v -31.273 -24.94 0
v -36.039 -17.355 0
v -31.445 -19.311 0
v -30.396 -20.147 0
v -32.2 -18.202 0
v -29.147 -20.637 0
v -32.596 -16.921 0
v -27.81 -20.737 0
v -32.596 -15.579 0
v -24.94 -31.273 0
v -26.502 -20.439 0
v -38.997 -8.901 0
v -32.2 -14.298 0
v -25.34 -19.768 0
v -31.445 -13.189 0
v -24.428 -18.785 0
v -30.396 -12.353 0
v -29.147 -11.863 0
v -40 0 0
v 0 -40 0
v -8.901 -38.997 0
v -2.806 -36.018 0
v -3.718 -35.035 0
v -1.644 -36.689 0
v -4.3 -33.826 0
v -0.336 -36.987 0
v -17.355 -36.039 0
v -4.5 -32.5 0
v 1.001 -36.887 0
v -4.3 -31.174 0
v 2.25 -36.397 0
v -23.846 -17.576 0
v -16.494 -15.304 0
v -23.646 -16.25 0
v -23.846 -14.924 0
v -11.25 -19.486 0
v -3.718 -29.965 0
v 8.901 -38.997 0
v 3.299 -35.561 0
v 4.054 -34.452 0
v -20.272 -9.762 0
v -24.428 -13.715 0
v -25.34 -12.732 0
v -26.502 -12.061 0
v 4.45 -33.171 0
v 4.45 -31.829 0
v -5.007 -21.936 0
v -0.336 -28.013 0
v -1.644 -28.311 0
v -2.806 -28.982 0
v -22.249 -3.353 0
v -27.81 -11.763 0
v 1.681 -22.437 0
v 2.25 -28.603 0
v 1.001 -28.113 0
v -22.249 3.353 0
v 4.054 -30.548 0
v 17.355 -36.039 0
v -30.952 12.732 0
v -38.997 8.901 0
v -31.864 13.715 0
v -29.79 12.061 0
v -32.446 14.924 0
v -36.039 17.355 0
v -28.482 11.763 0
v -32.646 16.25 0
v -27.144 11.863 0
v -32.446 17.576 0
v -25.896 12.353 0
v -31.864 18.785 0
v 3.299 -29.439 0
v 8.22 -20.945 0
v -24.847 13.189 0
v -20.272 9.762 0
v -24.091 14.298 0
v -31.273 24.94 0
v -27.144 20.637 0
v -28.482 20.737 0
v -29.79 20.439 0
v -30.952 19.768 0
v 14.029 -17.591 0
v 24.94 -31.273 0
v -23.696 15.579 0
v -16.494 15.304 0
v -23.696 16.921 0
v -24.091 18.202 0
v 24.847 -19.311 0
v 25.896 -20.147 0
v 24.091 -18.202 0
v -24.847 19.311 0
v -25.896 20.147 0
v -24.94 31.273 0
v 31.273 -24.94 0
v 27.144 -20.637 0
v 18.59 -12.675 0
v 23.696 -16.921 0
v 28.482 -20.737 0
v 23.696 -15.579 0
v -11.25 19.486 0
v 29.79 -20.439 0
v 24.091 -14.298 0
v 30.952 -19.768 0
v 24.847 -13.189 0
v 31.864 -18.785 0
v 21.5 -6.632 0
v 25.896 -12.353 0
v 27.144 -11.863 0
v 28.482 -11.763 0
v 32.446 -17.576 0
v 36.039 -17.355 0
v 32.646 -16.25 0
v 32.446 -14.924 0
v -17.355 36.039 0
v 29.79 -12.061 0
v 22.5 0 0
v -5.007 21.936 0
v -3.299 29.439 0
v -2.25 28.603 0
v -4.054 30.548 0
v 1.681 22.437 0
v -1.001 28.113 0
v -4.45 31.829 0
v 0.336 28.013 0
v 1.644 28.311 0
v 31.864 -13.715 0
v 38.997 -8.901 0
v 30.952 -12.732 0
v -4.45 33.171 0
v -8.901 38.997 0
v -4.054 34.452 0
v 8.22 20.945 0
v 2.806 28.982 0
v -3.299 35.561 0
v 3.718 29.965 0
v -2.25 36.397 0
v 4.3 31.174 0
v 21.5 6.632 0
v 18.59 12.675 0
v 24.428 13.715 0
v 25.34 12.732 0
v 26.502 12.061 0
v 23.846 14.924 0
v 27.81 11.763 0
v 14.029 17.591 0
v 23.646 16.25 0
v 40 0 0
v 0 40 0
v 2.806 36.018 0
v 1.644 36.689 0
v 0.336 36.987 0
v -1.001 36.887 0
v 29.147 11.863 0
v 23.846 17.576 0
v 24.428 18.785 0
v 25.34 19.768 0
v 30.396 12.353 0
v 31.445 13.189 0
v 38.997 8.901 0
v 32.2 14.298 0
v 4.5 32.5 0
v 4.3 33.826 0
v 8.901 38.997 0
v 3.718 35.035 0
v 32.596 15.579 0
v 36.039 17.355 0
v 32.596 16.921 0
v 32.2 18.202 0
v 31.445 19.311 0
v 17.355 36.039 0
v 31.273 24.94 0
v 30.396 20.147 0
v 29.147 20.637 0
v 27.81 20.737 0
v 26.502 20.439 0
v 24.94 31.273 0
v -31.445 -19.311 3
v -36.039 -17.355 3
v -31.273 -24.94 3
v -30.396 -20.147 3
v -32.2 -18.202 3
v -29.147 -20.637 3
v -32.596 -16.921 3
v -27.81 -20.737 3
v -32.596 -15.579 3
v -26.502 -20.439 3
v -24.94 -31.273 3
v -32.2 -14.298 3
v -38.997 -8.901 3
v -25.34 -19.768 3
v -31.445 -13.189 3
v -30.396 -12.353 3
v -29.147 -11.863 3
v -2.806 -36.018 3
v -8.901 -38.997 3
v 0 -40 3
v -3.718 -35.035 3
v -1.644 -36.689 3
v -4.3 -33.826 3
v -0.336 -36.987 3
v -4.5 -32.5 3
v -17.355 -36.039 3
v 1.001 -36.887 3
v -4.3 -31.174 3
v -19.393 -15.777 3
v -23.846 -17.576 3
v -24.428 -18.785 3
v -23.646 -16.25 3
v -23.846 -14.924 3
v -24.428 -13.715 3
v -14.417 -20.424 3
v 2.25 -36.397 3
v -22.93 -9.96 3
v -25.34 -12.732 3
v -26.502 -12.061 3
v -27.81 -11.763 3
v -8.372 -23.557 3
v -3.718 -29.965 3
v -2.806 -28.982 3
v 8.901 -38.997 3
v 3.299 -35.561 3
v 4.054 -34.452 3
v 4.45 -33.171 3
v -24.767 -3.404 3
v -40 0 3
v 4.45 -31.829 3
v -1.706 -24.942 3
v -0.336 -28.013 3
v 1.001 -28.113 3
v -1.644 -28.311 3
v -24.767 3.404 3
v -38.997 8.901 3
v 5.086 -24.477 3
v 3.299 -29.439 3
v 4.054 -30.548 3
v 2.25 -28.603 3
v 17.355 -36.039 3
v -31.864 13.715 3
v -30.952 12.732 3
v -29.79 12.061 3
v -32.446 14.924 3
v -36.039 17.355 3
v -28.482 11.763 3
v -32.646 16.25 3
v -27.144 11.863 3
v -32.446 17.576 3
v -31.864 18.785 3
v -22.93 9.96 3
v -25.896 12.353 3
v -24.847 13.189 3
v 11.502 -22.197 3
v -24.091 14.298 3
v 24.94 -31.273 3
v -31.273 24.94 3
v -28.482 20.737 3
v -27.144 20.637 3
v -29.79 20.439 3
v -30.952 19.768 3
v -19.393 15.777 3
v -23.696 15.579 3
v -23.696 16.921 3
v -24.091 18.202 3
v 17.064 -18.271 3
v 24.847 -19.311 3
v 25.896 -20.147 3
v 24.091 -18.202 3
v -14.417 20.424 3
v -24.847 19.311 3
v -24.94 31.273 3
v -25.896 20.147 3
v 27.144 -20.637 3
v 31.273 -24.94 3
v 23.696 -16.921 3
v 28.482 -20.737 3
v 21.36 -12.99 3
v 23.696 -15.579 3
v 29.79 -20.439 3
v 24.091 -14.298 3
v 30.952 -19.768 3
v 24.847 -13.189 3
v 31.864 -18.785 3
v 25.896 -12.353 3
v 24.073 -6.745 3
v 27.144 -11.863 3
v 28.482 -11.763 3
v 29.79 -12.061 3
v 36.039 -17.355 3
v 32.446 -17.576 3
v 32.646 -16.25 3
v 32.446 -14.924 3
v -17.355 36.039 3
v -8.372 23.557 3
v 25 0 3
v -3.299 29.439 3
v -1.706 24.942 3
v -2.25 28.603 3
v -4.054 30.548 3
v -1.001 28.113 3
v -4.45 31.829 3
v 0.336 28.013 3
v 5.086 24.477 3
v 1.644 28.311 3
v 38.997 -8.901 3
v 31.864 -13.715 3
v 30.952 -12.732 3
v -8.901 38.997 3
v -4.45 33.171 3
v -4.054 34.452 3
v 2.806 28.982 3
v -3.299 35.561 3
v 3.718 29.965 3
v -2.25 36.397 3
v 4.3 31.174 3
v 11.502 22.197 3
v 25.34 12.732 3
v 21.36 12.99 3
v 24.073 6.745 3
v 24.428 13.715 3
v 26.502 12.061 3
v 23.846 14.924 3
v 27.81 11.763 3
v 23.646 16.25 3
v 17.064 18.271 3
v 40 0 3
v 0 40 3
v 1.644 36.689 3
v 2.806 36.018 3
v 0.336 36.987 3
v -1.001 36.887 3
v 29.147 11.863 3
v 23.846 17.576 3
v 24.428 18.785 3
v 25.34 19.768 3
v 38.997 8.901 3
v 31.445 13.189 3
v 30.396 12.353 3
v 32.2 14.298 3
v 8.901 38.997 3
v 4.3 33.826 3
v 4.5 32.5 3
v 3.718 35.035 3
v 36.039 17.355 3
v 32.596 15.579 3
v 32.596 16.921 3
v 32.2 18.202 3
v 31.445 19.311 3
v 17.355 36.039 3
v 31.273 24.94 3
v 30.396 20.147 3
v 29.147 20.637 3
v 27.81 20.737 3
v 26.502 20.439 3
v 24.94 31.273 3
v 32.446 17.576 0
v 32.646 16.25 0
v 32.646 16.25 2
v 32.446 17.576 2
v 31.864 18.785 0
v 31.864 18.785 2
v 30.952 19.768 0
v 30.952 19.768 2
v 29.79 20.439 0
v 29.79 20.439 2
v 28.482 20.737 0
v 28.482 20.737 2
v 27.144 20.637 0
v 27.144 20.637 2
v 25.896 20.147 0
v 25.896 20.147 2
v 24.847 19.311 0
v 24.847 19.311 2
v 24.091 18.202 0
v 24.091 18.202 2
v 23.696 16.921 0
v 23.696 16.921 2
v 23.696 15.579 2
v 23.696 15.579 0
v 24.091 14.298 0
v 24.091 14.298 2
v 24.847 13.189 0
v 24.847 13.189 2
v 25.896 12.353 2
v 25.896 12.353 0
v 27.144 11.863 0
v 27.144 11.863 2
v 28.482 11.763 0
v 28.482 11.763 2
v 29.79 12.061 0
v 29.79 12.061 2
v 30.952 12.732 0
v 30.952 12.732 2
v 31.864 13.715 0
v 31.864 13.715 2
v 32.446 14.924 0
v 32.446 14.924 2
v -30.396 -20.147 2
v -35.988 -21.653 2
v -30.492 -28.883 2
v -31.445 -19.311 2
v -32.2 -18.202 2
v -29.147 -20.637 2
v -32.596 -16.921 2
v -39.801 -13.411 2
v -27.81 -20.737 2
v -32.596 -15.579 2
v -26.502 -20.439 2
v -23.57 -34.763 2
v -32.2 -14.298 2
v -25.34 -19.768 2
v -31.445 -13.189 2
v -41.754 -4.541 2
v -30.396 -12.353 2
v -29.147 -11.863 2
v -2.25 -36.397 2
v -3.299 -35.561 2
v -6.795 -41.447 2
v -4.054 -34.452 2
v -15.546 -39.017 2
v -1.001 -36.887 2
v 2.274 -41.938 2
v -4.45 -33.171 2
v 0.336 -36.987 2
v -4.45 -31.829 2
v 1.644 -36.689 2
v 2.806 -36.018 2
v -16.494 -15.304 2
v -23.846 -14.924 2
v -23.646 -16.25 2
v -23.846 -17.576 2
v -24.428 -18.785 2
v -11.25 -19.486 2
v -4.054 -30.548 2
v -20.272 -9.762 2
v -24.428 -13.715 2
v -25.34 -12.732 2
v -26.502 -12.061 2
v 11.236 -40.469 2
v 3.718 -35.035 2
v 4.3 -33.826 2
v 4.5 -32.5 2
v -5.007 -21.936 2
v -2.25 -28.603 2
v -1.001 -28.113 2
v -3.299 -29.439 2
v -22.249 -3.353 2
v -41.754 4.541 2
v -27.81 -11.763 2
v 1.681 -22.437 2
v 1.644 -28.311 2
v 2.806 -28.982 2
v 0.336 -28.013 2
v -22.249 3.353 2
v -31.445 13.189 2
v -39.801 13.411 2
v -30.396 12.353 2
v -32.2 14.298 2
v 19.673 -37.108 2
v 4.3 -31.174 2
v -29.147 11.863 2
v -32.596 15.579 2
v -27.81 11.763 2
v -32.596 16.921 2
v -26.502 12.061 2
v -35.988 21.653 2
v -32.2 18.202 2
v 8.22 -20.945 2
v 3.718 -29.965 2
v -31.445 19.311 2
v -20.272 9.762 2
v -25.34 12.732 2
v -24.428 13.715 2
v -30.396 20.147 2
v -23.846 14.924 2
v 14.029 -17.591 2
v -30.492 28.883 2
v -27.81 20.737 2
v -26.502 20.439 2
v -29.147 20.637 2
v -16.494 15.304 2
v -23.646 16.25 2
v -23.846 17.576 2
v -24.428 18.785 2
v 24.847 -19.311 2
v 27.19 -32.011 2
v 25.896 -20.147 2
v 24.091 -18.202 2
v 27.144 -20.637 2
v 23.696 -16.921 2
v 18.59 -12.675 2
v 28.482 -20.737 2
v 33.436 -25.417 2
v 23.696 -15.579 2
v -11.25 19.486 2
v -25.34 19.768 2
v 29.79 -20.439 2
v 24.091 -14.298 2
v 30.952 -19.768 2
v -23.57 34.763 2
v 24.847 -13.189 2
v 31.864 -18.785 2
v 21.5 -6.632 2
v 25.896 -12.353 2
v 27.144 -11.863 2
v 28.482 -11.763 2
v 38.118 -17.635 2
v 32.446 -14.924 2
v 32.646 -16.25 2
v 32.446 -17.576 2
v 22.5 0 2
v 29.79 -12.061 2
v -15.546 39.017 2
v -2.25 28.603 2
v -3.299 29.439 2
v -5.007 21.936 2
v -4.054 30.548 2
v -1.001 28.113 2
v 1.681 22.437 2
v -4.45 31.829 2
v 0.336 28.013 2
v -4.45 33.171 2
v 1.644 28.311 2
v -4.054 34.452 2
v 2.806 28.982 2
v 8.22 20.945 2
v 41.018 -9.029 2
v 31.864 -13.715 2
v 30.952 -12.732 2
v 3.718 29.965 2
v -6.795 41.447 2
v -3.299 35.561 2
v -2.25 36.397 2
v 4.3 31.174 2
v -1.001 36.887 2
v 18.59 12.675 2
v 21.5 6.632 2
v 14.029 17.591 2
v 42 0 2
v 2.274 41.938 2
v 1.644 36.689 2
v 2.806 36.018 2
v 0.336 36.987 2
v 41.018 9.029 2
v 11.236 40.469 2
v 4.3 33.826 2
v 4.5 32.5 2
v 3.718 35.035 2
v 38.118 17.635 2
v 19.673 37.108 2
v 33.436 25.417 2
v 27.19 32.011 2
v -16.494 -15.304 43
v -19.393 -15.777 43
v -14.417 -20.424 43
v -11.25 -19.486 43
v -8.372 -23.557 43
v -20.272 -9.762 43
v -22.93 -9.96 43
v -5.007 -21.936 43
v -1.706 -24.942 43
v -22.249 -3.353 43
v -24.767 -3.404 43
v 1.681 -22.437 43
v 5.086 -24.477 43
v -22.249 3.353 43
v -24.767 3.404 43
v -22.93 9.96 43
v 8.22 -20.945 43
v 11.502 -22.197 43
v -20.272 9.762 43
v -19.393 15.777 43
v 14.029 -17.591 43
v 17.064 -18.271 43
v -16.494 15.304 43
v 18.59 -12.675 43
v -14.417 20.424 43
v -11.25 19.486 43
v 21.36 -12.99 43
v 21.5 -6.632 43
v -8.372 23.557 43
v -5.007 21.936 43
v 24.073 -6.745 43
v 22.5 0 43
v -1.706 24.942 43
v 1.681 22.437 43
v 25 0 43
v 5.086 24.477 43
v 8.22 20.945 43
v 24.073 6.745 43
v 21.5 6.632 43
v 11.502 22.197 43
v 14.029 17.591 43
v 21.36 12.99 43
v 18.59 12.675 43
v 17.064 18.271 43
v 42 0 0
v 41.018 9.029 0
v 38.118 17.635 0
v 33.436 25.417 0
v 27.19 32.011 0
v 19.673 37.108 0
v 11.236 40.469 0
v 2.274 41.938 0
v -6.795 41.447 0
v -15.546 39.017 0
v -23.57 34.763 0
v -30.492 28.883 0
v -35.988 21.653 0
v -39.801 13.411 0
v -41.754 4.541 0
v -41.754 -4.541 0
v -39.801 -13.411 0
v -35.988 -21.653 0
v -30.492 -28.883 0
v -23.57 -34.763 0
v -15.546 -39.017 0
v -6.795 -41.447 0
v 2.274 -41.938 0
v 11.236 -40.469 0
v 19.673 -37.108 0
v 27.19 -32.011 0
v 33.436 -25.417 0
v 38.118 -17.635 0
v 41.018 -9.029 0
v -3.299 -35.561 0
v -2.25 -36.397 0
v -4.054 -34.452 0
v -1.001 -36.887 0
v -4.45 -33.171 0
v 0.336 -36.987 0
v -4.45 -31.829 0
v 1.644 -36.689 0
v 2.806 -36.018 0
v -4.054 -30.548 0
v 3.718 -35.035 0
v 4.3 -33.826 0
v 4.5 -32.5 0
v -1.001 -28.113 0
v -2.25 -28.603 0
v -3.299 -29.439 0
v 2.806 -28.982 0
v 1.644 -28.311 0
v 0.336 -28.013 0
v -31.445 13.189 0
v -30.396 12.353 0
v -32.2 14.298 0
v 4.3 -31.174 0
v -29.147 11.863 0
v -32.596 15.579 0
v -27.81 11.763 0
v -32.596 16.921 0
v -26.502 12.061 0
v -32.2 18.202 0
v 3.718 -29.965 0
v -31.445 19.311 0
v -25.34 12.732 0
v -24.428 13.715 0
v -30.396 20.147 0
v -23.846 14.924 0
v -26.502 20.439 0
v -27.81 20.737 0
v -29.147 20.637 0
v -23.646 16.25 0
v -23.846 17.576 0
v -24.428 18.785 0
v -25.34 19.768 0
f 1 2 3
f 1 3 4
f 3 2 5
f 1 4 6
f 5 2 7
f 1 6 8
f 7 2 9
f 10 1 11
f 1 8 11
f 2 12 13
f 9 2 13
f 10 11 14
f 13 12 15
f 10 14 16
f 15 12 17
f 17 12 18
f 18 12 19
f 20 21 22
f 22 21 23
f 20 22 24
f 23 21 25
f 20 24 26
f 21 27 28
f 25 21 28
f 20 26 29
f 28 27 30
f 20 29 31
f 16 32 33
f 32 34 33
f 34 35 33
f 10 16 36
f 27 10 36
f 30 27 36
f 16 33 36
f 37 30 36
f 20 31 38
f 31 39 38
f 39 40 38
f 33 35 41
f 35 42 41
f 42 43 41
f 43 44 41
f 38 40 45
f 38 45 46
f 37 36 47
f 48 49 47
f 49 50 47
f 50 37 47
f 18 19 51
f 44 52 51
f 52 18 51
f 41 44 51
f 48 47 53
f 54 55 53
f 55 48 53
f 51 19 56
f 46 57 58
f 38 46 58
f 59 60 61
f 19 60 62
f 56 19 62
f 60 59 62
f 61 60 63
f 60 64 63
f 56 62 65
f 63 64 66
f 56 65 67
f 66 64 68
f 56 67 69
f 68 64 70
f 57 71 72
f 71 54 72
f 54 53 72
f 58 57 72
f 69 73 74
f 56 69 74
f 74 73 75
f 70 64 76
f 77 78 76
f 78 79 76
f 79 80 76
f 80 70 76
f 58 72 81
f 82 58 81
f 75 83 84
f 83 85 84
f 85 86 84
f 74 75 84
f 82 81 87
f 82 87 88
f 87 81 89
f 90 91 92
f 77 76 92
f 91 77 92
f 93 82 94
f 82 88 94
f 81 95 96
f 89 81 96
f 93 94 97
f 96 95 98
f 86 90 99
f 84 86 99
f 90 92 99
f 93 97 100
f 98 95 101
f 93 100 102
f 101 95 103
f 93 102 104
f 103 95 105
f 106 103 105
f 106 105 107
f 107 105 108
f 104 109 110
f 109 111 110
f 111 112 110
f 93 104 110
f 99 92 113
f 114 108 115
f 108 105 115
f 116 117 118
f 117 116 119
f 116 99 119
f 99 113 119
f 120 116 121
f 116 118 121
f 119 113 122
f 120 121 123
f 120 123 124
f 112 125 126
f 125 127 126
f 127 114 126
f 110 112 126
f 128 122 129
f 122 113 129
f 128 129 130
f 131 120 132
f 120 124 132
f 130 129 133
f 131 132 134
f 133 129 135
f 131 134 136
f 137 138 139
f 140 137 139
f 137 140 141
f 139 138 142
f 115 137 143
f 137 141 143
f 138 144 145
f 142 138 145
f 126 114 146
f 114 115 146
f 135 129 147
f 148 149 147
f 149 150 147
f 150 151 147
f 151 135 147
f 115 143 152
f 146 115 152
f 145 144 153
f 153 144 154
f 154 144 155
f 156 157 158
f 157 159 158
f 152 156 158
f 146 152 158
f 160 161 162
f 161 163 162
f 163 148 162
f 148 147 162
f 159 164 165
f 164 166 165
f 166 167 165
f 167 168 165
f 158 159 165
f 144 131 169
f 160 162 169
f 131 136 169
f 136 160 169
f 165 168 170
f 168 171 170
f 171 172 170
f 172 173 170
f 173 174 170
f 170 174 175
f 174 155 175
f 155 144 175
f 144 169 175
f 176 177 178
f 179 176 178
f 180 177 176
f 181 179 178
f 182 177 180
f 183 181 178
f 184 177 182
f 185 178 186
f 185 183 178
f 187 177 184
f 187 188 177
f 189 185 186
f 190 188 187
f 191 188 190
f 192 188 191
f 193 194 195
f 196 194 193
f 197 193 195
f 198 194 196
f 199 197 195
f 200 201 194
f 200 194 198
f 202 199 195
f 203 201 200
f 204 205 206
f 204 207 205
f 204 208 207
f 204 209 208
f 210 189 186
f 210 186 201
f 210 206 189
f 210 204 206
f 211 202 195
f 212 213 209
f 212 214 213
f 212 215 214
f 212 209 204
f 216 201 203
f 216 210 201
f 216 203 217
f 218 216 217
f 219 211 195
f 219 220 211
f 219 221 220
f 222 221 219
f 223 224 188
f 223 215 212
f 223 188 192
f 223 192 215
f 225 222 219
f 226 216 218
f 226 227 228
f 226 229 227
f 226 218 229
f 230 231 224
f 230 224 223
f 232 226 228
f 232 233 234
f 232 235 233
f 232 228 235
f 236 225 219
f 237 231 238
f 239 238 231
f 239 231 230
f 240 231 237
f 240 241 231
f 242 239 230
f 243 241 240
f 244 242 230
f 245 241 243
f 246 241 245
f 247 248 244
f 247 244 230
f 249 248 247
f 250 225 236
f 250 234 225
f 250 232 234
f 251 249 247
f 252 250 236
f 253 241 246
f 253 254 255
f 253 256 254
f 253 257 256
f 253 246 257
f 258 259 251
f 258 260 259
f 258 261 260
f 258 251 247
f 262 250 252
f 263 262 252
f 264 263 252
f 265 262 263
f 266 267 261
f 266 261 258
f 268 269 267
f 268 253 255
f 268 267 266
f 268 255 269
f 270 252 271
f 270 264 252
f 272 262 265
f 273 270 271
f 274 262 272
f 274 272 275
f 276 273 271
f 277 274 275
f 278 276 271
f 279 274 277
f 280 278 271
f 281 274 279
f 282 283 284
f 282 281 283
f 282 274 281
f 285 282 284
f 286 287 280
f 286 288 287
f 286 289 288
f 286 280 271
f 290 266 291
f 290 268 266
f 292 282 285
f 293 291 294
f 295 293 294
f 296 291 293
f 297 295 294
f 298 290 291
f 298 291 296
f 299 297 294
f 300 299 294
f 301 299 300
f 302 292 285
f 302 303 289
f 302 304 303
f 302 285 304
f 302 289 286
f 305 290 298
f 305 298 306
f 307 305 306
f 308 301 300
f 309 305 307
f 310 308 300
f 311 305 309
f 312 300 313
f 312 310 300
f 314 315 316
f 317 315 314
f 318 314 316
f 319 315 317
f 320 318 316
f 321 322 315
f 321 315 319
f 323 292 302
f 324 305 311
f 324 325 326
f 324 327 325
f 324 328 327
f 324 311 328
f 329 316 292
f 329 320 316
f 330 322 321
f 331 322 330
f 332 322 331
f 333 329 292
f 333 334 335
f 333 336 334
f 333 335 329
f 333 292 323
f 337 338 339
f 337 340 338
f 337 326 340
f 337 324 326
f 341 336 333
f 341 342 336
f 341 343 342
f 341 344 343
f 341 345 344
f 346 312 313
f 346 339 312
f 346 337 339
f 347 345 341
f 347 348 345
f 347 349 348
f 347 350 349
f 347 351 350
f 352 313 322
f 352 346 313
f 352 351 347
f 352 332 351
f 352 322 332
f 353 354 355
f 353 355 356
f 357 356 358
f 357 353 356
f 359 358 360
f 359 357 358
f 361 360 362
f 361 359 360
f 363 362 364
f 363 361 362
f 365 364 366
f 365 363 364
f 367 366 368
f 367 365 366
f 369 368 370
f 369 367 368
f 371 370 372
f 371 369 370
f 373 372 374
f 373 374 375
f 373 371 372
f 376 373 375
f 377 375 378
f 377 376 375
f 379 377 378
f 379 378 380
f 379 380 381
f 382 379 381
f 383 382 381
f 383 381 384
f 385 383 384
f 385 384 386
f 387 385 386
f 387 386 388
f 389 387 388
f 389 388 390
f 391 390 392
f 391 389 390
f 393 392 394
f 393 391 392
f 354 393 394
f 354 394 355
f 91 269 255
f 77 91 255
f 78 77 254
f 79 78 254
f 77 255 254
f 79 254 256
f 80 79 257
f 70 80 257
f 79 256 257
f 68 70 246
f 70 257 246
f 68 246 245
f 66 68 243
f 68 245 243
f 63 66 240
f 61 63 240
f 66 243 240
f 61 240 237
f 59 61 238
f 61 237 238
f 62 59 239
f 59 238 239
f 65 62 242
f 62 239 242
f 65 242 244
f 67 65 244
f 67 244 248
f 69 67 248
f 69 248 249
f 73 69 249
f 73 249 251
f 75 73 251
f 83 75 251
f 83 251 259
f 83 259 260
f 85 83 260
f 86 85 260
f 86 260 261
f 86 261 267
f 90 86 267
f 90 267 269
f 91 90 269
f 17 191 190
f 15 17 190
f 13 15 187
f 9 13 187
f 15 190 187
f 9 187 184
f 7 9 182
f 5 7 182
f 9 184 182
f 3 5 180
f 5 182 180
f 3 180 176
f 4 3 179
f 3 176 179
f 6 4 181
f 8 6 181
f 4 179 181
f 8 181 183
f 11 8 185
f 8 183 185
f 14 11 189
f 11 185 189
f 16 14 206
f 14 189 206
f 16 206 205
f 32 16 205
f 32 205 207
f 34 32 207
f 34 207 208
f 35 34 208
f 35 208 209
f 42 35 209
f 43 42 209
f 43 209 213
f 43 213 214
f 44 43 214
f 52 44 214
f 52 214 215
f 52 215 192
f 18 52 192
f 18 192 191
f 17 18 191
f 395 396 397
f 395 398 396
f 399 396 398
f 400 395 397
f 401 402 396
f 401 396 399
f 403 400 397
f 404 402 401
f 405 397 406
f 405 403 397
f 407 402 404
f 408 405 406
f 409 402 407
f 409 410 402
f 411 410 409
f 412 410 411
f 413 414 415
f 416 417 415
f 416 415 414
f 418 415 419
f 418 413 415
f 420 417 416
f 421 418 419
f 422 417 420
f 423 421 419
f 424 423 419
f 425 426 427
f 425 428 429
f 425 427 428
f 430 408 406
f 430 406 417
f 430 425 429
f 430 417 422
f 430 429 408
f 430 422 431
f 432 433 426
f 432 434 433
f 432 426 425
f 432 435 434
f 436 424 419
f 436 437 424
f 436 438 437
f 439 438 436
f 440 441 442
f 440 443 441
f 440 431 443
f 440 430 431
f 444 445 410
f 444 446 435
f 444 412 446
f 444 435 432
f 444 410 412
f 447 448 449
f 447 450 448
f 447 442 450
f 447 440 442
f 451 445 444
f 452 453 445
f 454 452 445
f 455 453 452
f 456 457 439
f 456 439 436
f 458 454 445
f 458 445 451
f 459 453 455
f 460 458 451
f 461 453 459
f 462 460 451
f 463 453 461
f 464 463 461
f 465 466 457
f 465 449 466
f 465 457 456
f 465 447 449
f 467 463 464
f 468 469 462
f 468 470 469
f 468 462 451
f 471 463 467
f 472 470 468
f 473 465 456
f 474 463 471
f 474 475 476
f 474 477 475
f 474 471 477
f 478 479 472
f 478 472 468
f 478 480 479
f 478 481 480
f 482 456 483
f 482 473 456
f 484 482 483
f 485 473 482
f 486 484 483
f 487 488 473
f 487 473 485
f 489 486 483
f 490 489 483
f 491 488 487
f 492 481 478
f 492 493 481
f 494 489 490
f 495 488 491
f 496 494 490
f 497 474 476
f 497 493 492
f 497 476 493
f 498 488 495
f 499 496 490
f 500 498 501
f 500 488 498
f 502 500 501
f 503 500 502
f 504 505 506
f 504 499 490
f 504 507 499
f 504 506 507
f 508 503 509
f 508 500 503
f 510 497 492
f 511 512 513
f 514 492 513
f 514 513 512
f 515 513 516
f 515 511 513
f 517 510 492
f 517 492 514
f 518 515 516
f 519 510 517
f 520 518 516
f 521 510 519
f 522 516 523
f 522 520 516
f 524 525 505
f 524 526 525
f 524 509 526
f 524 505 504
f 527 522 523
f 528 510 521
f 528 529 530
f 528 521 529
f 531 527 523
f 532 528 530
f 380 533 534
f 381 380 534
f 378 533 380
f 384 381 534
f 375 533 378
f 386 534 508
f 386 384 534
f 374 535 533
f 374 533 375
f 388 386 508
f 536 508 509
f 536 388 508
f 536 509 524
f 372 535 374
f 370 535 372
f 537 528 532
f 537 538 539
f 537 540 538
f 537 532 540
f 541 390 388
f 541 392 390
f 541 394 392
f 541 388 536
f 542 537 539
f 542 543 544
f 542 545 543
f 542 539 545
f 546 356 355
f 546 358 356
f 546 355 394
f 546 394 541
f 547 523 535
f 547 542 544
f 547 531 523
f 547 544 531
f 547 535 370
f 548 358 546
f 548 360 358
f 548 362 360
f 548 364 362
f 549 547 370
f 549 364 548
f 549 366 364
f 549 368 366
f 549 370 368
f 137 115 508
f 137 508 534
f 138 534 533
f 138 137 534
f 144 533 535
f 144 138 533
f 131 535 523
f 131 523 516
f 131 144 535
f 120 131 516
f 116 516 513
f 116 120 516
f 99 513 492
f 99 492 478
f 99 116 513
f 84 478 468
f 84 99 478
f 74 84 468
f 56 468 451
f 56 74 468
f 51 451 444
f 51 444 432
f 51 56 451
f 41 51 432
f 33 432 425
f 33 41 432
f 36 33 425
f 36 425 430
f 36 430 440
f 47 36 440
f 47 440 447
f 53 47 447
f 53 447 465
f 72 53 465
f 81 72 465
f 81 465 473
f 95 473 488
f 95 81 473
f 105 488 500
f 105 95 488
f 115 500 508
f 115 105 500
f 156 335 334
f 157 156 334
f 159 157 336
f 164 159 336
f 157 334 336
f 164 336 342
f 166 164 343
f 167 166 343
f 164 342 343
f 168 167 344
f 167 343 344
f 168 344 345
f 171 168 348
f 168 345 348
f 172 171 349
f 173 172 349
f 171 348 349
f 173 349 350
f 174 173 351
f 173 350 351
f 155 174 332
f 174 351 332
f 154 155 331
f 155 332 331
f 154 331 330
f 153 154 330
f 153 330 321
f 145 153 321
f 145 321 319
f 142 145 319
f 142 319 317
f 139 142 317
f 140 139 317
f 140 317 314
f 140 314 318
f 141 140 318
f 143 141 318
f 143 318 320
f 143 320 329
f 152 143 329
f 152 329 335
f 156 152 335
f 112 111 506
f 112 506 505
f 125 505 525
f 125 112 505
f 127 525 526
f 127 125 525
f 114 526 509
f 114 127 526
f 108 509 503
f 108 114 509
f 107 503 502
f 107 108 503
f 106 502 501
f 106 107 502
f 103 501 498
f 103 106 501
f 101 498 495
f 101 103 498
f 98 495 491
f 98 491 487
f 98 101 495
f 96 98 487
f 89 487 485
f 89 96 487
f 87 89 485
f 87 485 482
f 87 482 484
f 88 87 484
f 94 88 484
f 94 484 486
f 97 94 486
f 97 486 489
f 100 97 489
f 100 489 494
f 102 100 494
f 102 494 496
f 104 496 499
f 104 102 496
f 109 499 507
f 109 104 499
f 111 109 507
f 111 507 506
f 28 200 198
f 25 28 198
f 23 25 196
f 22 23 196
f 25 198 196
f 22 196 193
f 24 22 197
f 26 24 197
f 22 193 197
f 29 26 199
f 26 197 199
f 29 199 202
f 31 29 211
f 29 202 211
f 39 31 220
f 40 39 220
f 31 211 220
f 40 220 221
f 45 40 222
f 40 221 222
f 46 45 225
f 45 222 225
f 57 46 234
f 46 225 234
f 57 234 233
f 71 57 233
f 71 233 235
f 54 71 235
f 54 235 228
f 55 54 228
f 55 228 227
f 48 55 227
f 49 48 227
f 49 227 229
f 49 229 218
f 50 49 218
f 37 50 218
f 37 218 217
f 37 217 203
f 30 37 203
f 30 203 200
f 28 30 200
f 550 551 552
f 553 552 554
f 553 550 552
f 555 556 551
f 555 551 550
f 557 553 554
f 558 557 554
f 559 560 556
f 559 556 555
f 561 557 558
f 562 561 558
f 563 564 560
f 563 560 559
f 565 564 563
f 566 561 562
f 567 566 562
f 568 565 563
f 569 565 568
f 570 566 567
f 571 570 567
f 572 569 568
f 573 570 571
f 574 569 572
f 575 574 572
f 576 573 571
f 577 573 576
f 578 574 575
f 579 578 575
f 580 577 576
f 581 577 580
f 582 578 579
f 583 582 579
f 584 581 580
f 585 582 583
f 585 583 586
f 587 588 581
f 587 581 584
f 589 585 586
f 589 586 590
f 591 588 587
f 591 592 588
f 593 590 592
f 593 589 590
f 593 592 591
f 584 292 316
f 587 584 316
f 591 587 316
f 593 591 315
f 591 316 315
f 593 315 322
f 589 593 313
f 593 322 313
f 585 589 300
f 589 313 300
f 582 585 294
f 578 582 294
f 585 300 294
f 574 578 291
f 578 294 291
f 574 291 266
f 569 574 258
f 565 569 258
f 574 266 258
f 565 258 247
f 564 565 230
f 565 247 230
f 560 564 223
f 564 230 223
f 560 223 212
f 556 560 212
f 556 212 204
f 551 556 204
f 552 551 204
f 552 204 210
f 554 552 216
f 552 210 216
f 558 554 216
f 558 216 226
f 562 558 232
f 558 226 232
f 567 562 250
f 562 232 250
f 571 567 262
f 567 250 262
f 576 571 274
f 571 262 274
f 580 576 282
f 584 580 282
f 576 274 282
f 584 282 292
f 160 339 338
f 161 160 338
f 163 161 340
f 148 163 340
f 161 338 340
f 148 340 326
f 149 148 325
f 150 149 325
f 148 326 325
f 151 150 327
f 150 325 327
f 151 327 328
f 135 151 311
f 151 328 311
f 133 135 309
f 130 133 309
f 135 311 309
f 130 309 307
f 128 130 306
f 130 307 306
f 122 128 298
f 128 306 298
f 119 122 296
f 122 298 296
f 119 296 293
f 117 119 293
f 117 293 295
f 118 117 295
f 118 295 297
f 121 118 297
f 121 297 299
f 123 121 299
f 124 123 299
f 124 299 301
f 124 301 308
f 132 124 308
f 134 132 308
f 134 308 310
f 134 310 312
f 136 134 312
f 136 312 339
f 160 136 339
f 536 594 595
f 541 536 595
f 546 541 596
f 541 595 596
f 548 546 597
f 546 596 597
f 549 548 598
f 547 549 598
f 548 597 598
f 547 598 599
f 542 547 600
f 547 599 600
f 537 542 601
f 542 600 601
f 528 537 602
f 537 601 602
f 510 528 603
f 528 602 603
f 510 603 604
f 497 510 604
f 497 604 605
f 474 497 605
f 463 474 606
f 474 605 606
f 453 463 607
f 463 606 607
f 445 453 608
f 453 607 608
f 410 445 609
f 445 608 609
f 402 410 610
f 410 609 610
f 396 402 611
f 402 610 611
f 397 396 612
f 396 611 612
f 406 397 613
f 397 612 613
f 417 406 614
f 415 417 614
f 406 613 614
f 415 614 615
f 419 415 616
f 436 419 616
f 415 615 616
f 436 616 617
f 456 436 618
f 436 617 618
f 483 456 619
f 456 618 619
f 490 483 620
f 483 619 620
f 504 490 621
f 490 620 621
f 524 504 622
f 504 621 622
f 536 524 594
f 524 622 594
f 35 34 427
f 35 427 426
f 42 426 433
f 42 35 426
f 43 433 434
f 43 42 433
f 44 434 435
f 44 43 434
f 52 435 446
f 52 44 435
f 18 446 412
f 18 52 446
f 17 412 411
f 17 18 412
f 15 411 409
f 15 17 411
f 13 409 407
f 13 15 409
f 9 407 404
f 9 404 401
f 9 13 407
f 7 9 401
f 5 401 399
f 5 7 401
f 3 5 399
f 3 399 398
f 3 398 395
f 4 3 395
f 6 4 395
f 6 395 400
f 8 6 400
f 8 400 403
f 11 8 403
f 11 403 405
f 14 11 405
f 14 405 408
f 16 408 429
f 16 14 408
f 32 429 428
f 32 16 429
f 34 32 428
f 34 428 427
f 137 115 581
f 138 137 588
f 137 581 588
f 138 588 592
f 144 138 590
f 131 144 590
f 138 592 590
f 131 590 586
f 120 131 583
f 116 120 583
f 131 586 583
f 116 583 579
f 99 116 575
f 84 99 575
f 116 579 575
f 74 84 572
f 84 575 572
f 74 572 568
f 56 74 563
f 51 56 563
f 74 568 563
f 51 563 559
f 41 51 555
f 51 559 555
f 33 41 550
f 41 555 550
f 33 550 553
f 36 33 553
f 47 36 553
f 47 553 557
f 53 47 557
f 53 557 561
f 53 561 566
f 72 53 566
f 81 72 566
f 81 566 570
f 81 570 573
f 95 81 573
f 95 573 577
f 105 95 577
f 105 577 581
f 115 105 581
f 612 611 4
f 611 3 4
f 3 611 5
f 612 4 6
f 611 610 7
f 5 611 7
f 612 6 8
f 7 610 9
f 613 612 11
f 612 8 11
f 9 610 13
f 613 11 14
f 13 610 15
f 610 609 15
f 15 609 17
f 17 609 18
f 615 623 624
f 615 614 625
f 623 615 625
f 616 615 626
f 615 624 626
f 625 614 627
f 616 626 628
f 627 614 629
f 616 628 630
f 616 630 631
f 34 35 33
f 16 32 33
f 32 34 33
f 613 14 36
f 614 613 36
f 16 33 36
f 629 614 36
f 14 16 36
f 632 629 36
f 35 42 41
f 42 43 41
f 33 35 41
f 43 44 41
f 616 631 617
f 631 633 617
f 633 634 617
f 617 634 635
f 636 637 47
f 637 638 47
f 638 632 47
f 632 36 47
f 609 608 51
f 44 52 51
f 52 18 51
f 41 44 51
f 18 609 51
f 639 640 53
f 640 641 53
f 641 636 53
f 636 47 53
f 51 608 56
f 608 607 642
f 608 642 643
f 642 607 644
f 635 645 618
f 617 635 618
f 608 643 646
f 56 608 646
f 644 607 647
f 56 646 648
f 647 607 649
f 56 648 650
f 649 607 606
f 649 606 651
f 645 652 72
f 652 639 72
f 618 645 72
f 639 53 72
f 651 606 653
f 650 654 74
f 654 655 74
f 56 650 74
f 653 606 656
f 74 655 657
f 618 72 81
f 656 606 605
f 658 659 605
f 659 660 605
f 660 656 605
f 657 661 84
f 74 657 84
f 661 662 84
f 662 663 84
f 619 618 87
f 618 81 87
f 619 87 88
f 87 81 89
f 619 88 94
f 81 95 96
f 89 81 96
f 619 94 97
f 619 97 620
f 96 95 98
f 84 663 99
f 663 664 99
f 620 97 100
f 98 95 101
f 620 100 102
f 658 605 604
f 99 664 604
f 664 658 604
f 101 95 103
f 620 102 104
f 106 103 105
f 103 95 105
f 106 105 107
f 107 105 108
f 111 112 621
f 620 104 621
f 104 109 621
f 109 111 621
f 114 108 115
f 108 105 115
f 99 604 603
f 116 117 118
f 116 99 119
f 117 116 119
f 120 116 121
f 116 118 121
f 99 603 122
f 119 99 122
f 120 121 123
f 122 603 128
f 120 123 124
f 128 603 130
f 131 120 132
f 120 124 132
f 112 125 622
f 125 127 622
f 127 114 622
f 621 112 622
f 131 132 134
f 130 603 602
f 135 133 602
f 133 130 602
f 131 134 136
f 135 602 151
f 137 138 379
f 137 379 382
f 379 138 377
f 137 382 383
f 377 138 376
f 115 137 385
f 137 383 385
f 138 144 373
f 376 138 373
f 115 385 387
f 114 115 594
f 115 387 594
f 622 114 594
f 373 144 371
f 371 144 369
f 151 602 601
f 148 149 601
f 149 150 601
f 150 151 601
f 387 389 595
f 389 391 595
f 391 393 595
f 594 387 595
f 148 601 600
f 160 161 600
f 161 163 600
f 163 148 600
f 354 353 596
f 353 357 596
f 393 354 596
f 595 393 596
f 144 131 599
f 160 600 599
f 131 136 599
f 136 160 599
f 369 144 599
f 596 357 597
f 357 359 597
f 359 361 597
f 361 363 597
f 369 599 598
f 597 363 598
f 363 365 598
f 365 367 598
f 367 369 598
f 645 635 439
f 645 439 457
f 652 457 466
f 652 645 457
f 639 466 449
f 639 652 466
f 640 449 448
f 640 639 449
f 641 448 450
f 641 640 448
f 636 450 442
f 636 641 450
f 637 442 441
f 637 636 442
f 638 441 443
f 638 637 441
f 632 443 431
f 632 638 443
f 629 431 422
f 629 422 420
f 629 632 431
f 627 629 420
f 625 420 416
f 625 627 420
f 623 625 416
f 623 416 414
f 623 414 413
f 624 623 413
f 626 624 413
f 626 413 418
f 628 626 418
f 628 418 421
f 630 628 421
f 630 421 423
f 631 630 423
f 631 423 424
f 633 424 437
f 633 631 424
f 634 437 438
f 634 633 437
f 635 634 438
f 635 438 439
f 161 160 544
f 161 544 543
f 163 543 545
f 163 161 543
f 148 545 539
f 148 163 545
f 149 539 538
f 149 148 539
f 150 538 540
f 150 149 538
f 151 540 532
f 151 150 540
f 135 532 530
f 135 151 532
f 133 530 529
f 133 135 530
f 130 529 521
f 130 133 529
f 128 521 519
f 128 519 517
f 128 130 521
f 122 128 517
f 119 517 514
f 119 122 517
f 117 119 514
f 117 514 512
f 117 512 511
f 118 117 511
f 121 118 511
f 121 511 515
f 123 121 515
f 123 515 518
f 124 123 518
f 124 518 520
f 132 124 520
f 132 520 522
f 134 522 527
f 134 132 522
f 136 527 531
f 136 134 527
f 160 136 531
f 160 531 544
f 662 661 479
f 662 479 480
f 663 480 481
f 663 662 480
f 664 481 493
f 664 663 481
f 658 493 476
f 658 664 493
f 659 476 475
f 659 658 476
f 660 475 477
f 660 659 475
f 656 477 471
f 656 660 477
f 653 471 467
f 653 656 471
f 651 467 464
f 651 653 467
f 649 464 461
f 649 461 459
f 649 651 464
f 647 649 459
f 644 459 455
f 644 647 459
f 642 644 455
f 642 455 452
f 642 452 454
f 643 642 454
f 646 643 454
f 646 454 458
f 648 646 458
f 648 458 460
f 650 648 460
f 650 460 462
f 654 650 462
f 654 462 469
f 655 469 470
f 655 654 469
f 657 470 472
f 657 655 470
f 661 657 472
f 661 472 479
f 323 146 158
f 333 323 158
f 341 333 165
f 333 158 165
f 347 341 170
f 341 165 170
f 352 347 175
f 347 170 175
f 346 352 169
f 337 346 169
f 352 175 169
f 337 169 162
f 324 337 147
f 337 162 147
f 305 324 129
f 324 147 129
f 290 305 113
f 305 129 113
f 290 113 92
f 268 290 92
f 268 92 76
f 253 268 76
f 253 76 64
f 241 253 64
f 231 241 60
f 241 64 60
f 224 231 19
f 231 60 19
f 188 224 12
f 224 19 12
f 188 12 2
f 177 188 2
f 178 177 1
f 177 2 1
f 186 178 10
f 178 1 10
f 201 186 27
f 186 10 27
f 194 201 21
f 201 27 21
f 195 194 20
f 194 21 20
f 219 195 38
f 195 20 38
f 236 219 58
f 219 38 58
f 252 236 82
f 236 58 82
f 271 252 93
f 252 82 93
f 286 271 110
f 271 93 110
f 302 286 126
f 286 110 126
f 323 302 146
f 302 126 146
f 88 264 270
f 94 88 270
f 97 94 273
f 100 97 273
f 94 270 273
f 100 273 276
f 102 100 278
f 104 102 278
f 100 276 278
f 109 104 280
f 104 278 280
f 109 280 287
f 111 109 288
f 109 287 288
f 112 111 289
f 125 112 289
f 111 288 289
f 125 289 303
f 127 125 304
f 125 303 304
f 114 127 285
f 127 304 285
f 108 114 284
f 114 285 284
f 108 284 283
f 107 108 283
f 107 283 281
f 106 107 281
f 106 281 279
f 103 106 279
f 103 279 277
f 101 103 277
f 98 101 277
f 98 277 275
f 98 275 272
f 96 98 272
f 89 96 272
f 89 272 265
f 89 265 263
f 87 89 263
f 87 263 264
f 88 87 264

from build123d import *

# Parameters (mm, degrees)
SKETCH_R           = 40
PAD_DEPTH          = 3
SKETCH001_R        = 25
PAD001_DEPTH       = 40
SKETCH002_R        = 22.5
POCKET_DEPTH       = 43.001
SKETCH003_R        = 4.5
POCKET001_DEPTH    = 245.067107
POLARPATTERN_COUNT = 6
SKETCH004_R        = 42
SKETCH004_R_2      = 22.5
SKETCH004_R_3      = 4.5
PAD002_DEPTH       = 2


with BuildPart() as pipe:
    # Sketch → Pad (new body)
    with BuildSketch(Plane.XY):
        Circle(SKETCH_R)
    extrude(amount=PAD_DEPTH)

    # Sketch001 (on Face3 of Pad) → Pad001 (join)
    with BuildSketch(Plane.XY.offset(3)):
        Circle(SKETCH001_R)
    extrude(amount=PAD001_DEPTH)

    # Sketch002 (on Face5 of Pad001) → Pocket (cut, through all)
    with BuildSketch(Plane.XY.offset(43)):
        Circle(SKETCH002_R)
    extrude(amount=-POCKET_DEPTH, mode=Mode.SUBTRACT)

    # Sketch003 (on Face3 of Pocket) → Pocket001 (cut, through all)
    with BuildSketch(Plane.XY.offset(3)):
        with Locations((0, 32.5)):
            Circle(SKETCH003_R)
    pocket001 = extrude(amount=-POCKET001_DEPTH, mode=Mode.SUBTRACT)

    # PolarPattern: Pocket001 ×6 about axis
    polarpattern_axis = Axis((0, 0, 3), (0, 0, 1))
    for i in range(1, POLARPATTERN_COUNT):
        add(pocket001.rotate(polarpattern_axis, i * 360 / POLARPATTERN_COUNT), mode=Mode.SUBTRACT)


with BuildPart() as gasket:
    # Sketch004 → Pad002 (new body)
    with BuildSketch(Plane.XY):
        Circle(SKETCH004_R)
        Circle(SKETCH004_R_2, mode=Mode.SUBTRACT)
        with Locations((0, 32.5)):
            Circle(SKETCH004_R_3, mode=Mode.SUBTRACT)
        with Locations((-28.145826, -16.25)):
            Circle(SKETCH004_R_3, mode=Mode.SUBTRACT)
        with Locations((28.145826, -16.25)):
            Circle(SKETCH004_R_3, mode=Mode.SUBTRACT)
        with Locations((-28.145826, 16.25)):
            Circle(SKETCH004_R_3, mode=Mode.SUBTRACT)
        with Locations((28.145826, 16.25)):
            Circle(SKETCH004_R_3, mode=Mode.SUBTRACT)
        with Locations((0, -32.5)):
            Circle(SKETCH004_R_3, mode=Mode.SUBTRACT)
    extrude(amount=PAD002_DEPTH)


solid = Compound([pipe.part, gasket.part])
